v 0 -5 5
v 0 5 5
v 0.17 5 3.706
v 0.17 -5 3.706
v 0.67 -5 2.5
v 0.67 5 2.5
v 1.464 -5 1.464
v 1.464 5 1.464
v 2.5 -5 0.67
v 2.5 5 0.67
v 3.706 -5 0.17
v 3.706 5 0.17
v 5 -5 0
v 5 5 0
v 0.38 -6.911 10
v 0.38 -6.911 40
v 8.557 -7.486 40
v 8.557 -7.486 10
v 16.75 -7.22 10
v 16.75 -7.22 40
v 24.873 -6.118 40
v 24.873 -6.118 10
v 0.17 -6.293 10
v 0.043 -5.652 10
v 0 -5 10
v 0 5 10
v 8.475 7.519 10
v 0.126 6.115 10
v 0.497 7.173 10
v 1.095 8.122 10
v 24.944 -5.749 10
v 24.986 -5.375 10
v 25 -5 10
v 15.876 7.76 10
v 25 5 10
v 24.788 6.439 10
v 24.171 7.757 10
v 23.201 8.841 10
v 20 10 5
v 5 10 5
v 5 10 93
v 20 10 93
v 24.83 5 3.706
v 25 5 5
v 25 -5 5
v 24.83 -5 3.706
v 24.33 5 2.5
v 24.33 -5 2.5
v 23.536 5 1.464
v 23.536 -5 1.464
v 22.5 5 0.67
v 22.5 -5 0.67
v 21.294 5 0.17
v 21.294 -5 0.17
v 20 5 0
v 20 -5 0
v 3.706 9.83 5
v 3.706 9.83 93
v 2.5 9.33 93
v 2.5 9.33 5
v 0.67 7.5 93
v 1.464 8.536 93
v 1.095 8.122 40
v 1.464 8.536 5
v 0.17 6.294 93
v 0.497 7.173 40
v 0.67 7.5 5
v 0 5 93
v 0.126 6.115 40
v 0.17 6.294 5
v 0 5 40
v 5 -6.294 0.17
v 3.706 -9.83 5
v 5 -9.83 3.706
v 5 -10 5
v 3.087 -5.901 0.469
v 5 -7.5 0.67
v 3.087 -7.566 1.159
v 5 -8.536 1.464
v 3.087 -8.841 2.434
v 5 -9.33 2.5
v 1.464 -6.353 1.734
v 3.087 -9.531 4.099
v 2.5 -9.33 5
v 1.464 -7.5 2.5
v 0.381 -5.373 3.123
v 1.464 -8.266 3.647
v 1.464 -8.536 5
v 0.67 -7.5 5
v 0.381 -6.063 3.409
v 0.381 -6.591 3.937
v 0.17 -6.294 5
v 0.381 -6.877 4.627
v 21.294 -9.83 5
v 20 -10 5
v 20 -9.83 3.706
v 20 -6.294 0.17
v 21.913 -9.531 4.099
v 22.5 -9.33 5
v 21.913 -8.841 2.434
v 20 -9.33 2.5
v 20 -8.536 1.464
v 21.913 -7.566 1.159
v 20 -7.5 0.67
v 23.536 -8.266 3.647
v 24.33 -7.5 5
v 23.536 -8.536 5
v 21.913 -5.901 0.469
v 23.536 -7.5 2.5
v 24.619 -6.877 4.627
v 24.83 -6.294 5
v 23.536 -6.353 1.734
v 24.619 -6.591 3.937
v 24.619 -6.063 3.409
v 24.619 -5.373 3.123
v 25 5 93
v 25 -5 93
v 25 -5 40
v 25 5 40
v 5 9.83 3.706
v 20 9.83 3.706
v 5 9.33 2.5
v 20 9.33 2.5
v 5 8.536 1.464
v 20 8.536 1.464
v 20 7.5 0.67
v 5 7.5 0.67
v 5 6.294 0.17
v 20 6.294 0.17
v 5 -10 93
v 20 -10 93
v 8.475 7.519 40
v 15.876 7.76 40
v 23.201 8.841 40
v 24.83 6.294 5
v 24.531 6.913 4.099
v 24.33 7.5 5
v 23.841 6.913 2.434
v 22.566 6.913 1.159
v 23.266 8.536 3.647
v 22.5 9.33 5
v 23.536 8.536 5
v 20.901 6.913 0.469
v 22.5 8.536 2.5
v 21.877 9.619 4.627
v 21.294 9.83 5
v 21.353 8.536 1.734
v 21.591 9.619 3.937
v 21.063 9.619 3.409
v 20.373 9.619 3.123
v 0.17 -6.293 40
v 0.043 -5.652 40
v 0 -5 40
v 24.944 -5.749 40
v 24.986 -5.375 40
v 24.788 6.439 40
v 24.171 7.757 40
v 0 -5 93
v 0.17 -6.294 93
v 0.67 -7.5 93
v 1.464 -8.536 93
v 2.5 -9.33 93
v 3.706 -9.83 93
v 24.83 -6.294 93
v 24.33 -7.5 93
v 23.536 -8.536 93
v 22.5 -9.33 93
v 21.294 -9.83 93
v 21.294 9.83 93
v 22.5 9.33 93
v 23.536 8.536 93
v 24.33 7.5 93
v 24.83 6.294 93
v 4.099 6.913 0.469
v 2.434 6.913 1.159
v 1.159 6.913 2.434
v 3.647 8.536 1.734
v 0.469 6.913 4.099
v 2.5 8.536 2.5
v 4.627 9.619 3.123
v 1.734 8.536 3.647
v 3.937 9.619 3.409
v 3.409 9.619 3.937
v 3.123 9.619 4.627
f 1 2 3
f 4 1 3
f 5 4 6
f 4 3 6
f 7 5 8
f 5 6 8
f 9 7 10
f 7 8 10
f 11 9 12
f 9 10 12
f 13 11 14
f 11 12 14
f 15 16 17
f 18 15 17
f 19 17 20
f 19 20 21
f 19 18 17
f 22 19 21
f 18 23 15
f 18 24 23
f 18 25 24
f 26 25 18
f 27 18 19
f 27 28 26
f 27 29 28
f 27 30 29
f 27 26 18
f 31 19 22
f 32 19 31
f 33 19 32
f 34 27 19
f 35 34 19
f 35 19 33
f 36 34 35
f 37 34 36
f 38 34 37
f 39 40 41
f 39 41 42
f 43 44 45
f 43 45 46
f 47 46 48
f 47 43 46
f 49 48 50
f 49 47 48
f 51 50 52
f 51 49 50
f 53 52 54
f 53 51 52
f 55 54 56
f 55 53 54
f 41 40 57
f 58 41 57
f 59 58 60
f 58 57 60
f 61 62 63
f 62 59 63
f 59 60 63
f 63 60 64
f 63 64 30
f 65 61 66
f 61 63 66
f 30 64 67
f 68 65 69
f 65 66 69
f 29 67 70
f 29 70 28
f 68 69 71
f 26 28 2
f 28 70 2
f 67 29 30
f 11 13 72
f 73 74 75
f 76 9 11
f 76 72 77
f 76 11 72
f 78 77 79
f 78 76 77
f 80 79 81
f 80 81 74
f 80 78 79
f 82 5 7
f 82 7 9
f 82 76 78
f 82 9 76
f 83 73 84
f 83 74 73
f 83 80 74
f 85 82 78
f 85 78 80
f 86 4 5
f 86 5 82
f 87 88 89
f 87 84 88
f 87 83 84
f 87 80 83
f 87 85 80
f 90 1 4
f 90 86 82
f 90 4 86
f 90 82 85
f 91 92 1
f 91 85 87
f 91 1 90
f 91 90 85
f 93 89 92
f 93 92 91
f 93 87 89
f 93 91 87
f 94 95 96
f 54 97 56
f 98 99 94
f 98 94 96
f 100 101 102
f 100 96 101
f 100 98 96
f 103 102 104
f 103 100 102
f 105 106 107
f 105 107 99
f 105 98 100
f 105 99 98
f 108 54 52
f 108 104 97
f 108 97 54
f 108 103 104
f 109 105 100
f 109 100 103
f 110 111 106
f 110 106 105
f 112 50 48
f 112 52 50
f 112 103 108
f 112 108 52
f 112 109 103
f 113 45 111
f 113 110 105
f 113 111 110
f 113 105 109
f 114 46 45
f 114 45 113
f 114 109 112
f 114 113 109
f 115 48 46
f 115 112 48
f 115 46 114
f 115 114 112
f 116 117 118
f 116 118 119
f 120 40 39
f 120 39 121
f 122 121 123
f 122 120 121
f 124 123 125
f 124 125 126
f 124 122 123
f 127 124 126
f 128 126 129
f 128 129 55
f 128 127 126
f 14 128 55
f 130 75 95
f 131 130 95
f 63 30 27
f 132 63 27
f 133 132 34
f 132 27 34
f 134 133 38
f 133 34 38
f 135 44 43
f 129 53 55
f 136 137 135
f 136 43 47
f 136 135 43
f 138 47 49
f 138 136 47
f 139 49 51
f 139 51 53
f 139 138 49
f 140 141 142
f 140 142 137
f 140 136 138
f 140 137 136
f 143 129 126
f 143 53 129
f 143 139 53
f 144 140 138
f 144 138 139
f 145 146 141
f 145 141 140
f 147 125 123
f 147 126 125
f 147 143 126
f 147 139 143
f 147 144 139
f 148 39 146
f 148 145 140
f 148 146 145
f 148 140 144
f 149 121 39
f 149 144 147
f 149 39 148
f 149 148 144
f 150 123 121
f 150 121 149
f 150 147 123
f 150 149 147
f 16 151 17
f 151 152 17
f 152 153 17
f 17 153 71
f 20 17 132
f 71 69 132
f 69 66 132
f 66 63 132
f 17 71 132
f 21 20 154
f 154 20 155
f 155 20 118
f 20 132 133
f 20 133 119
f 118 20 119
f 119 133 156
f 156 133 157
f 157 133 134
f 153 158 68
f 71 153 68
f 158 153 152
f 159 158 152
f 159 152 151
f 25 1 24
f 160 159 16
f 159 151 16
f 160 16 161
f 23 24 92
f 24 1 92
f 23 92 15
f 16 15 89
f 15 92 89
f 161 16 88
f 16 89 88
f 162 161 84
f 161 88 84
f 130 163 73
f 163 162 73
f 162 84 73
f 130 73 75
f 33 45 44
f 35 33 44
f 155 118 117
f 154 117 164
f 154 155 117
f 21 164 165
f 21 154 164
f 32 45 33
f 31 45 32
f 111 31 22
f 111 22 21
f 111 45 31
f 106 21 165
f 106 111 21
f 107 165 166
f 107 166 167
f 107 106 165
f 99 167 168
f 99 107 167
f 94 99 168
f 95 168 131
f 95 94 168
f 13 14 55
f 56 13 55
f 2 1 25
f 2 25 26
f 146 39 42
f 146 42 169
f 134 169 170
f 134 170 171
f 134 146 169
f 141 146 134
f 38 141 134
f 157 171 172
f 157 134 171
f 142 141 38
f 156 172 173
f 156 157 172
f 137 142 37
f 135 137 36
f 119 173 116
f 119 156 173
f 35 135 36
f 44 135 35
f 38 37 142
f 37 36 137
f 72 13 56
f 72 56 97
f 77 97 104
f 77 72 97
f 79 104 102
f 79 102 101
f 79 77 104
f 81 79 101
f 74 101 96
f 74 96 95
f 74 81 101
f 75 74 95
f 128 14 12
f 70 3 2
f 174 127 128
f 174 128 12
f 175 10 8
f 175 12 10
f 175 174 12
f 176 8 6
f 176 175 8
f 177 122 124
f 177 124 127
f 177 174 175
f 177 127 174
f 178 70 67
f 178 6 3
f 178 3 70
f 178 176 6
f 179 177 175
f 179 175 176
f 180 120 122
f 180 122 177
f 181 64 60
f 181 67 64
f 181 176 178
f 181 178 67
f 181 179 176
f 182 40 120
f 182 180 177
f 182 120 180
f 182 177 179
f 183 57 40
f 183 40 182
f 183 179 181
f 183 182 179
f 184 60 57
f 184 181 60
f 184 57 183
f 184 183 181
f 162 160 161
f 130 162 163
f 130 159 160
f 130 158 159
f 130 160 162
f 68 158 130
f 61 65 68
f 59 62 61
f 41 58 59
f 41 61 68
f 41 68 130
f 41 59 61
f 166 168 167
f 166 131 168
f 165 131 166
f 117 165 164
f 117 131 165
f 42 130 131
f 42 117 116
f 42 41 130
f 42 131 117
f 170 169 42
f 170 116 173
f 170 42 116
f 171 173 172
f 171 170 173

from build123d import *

# Parameters (mm, degrees)
F0_W         = 25
F0_H         = 20
F1_DEPTH     = 93
F3_R         = 80
F3_R_2       = 65
F4_DEPTH     = 30
F6_T1_DEPTH  = 10
F6_T3_DEPTH  = 15
F6_T5_DEPTH  = 100.5
F6_S9_W      = 5
F6_S9_H      = 5
F6_T10_DEPTH = 5
F6_S15_W     = 5
F6_S15_H     = 5
F6_T16_DEPTH = 5
F6_S21_W     = 5
F6_S21_H     = 5
F6_T22_DEPTH = 5
F6_S27_W     = 5
F6_S27_H     = 5
F6_T28_DEPTH = 5


# Not quite as in the source:
# - a fillet or chamfer that OpenCascade refuses, or shapes differently, is made with other operations: its cross-section is extruded or revolved along the edge and cut away or added


with BuildPart() as f1:
    # F0 (on Top) → F1 (new body)
    with BuildSketch(Plane.XY):
        with Locations((12.5, 0)):
            Rectangle(F0_W, F0_H)
    extrude(amount=F1_DEPTH)


with BuildPart() as f4:
    # F3 (on offset) → F4 (new body)
    with BuildSketch(Plane.XY.offset(10)):
        with Locations((10.065856821, 72.5)):
            Circle(F3_R)
        with Locations((10.065856821, 72.5)):
            Circle(F3_R_2, mode=Mode.SUBTRACT)
    extrude(amount=F4_DEPTH)


with BuildPart() as f1_1:
    add(f1.part)

    # F5: cut F4
    add(f4.part, mode=Mode.SUBTRACT)

    # F6: fillet of radius 5 on 8 edges, made by hand

    # F6_s2 → F6_t1 (cut)
    with BuildSketch(Plane.XZ.offset(-5)):
        with BuildLine():
            ThreePointArc((0, 5), (1.4644660941, 1.4644660941), (5, 0))
            Line((5, 0), (0, 0))
            Line((0, 0), (0, 5))
        make_face()
        with BuildLine():
            ThreePointArc((25, 5), (23.5355339059, 1.4644660941), (20, 0))
            Line((20, 0), (25, 0))
            Line((25, 0), (25, 5))
        make_face()
    extrude(amount=F6_T1_DEPTH, mode=Mode.SUBTRACT)

    # F6_s4 → F6_t3 (cut)
    with BuildSketch(Plane.YZ.offset(5)):
        with BuildLine():
            ThreePointArc((10, 5), (8.5355339059, 1.4644660941), (5, 0))
            Line((5, 0), (10, 0))
            Line((10, 0), (10, 5))
        make_face()
        with BuildLine():
            ThreePointArc((-5, 0), (-8.5355339059, 1.4644660941), (-10, 5))
            Line((-10, 5), (-10, 0))
            Line((-10, 0), (-5, 0))
        make_face()
    extrude(amount=F6_T3_DEPTH, mode=Mode.SUBTRACT)

    # F6_s6 → F6_t5 (cut)
    with BuildSketch(Plane.XY.offset(5)):
        with BuildLine():
            ThreePointArc((25, -5), (23.5355339059, -8.5355339059), (20, -10))
            Line((20, -10), (25, -10))
            Line((25, -10), (25, -5))
        make_face()
        with BuildLine():
            ThreePointArc((0, -5), (1.4644660941, -8.5355339059), (5, -10))
            Line((5, -10), (0, -10))
            Line((0, -10), (0, -5))
        make_face()
        with BuildLine():
            ThreePointArc((5, 10), (1.4644660941, 8.5355339059), (0, 5))
            Line((0, 5), (0, 10))
            Line((0, 10), (5, 10))
        make_face()
        with BuildLine():
            ThreePointArc((20, 10), (23.5355339059, 8.5355339059), (25, 5))
            Line((25, 5), (25, 10))
            Line((25, 10), (20, 10))
        make_face()
    extrude(amount=F6_T5_DEPTH, mode=Mode.SUBTRACT)


with BuildPart() as f6_tool8:
    # F6_s9 → F6_t10 (new body)
    with BuildSketch(Plane.XZ.offset(-5)):
        with Locations((2.5, 2.5)):
            Rectangle(F6_S9_W, F6_S9_H)
    extrude(amount=-F6_T10_DEPTH)

    # F6_s11 → F6_t12 (revolve, cut)
    with BuildSketch(Plane(origin=(5, 5, 5), x_dir=(0.7071067812, 0, 0.7071067812), z_dir=(-0.7071067812, 0, 0.7071067812))):
        with BuildLine():
            ThreePointArc((0, -5), (5, 0), (0, 5))
            Line((0, 5), (0, -5))
        make_face()
    revolve(axis=Axis((5, 5, 5), (0, 1, 0)), mode=Mode.SUBTRACT)


with BuildPart() as f1_2:
    add(f1_1.part)

    # F6_t7: cut F6_tool8
    add(f6_tool8.part, mode=Mode.SUBTRACT)


with BuildPart() as f6_tool14:
    # F6_s15 → F6_t16 (new body)
    with BuildSketch(Plane.YZ.offset(5)):
        with Locations((-7.5, 2.5)):
            Rectangle(F6_S15_W, F6_S15_H)
    extrude(amount=-F6_T16_DEPTH)

    # F6_s17 → F6_t18 (revolve, cut)
    with BuildSketch(Plane(origin=(5, -5, 5), x_dir=(0, 0.7071067812, 0.7071067812), z_dir=(0, -0.7071067812, 0.7071067812))):
        with BuildLine():
            ThreePointArc((0, -5), (5, 0), (0, 5))
            Line((0, 5), (0, -5))
        make_face()
    revolve(axis=Axis((5, -5, 5), (-1, 0, 0)), mode=Mode.SUBTRACT)


with BuildPart() as f1_3:
    add(f1_2.part)

    # F6_t13: cut F6_tool14
    add(f6_tool14.part, mode=Mode.SUBTRACT)


with BuildPart() as f6_tool20:
    # F6_s21 → F6_t22 (new body)
    with BuildSketch(Plane.XZ.offset(-5)):
        with Locations((22.5, 2.5)):
            Rectangle(F6_S21_W, F6_S21_H)
    extrude(amount=-F6_T22_DEPTH)

    # F6_s23 → F6_t24 (revolve, cut)
    with BuildSketch(Plane(origin=(20, 5, 5), x_dir=(-0.7071067812, 0, 0.7071067812), z_dir=(-0.7071067812, 0, -0.7071067812))):
        with BuildLine():
            ThreePointArc((0, -5), (5, 0), (0, 5))
            Line((0, 5), (0, -5))
        make_face()
    revolve(axis=Axis((20, 5, 5), (0, 1, 0)), mode=Mode.SUBTRACT)


with BuildPart() as f1_4:
    add(f1_3.part)

    # F6_t19: cut F6_tool20
    add(f6_tool20.part, mode=Mode.SUBTRACT)


with BuildPart() as f6_tool26:
    # F6_s27 → F6_t28 (new body)
    with BuildSketch(Plane.YZ.offset(20)):
        with Locations((-7.5, 2.5)):
            Rectangle(F6_S27_W, F6_S27_H)
    extrude(amount=F6_T28_DEPTH)

    # F6_s29 → F6_t30 (revolve, cut)
    with BuildSketch(Plane(origin=(20, -5, 5), x_dir=(0, 0.7071067812, 0.7071067812), z_dir=(0, 0.7071067812, -0.7071067812))):
        with BuildLine():
            ThreePointArc((0, -5), (5, 0), (0, 5))
            Line((0, 5), (0, -5))
        make_face()
    revolve(axis=Axis((20, -5, 5), (1, 0, 0)), mode=Mode.SUBTRACT)


with BuildPart() as f1_5:
    add(f1_4.part)

    # F6_t25: cut F6_tool26
    add(f6_tool26.part, mode=Mode.SUBTRACT)


solid = f1_5.part
